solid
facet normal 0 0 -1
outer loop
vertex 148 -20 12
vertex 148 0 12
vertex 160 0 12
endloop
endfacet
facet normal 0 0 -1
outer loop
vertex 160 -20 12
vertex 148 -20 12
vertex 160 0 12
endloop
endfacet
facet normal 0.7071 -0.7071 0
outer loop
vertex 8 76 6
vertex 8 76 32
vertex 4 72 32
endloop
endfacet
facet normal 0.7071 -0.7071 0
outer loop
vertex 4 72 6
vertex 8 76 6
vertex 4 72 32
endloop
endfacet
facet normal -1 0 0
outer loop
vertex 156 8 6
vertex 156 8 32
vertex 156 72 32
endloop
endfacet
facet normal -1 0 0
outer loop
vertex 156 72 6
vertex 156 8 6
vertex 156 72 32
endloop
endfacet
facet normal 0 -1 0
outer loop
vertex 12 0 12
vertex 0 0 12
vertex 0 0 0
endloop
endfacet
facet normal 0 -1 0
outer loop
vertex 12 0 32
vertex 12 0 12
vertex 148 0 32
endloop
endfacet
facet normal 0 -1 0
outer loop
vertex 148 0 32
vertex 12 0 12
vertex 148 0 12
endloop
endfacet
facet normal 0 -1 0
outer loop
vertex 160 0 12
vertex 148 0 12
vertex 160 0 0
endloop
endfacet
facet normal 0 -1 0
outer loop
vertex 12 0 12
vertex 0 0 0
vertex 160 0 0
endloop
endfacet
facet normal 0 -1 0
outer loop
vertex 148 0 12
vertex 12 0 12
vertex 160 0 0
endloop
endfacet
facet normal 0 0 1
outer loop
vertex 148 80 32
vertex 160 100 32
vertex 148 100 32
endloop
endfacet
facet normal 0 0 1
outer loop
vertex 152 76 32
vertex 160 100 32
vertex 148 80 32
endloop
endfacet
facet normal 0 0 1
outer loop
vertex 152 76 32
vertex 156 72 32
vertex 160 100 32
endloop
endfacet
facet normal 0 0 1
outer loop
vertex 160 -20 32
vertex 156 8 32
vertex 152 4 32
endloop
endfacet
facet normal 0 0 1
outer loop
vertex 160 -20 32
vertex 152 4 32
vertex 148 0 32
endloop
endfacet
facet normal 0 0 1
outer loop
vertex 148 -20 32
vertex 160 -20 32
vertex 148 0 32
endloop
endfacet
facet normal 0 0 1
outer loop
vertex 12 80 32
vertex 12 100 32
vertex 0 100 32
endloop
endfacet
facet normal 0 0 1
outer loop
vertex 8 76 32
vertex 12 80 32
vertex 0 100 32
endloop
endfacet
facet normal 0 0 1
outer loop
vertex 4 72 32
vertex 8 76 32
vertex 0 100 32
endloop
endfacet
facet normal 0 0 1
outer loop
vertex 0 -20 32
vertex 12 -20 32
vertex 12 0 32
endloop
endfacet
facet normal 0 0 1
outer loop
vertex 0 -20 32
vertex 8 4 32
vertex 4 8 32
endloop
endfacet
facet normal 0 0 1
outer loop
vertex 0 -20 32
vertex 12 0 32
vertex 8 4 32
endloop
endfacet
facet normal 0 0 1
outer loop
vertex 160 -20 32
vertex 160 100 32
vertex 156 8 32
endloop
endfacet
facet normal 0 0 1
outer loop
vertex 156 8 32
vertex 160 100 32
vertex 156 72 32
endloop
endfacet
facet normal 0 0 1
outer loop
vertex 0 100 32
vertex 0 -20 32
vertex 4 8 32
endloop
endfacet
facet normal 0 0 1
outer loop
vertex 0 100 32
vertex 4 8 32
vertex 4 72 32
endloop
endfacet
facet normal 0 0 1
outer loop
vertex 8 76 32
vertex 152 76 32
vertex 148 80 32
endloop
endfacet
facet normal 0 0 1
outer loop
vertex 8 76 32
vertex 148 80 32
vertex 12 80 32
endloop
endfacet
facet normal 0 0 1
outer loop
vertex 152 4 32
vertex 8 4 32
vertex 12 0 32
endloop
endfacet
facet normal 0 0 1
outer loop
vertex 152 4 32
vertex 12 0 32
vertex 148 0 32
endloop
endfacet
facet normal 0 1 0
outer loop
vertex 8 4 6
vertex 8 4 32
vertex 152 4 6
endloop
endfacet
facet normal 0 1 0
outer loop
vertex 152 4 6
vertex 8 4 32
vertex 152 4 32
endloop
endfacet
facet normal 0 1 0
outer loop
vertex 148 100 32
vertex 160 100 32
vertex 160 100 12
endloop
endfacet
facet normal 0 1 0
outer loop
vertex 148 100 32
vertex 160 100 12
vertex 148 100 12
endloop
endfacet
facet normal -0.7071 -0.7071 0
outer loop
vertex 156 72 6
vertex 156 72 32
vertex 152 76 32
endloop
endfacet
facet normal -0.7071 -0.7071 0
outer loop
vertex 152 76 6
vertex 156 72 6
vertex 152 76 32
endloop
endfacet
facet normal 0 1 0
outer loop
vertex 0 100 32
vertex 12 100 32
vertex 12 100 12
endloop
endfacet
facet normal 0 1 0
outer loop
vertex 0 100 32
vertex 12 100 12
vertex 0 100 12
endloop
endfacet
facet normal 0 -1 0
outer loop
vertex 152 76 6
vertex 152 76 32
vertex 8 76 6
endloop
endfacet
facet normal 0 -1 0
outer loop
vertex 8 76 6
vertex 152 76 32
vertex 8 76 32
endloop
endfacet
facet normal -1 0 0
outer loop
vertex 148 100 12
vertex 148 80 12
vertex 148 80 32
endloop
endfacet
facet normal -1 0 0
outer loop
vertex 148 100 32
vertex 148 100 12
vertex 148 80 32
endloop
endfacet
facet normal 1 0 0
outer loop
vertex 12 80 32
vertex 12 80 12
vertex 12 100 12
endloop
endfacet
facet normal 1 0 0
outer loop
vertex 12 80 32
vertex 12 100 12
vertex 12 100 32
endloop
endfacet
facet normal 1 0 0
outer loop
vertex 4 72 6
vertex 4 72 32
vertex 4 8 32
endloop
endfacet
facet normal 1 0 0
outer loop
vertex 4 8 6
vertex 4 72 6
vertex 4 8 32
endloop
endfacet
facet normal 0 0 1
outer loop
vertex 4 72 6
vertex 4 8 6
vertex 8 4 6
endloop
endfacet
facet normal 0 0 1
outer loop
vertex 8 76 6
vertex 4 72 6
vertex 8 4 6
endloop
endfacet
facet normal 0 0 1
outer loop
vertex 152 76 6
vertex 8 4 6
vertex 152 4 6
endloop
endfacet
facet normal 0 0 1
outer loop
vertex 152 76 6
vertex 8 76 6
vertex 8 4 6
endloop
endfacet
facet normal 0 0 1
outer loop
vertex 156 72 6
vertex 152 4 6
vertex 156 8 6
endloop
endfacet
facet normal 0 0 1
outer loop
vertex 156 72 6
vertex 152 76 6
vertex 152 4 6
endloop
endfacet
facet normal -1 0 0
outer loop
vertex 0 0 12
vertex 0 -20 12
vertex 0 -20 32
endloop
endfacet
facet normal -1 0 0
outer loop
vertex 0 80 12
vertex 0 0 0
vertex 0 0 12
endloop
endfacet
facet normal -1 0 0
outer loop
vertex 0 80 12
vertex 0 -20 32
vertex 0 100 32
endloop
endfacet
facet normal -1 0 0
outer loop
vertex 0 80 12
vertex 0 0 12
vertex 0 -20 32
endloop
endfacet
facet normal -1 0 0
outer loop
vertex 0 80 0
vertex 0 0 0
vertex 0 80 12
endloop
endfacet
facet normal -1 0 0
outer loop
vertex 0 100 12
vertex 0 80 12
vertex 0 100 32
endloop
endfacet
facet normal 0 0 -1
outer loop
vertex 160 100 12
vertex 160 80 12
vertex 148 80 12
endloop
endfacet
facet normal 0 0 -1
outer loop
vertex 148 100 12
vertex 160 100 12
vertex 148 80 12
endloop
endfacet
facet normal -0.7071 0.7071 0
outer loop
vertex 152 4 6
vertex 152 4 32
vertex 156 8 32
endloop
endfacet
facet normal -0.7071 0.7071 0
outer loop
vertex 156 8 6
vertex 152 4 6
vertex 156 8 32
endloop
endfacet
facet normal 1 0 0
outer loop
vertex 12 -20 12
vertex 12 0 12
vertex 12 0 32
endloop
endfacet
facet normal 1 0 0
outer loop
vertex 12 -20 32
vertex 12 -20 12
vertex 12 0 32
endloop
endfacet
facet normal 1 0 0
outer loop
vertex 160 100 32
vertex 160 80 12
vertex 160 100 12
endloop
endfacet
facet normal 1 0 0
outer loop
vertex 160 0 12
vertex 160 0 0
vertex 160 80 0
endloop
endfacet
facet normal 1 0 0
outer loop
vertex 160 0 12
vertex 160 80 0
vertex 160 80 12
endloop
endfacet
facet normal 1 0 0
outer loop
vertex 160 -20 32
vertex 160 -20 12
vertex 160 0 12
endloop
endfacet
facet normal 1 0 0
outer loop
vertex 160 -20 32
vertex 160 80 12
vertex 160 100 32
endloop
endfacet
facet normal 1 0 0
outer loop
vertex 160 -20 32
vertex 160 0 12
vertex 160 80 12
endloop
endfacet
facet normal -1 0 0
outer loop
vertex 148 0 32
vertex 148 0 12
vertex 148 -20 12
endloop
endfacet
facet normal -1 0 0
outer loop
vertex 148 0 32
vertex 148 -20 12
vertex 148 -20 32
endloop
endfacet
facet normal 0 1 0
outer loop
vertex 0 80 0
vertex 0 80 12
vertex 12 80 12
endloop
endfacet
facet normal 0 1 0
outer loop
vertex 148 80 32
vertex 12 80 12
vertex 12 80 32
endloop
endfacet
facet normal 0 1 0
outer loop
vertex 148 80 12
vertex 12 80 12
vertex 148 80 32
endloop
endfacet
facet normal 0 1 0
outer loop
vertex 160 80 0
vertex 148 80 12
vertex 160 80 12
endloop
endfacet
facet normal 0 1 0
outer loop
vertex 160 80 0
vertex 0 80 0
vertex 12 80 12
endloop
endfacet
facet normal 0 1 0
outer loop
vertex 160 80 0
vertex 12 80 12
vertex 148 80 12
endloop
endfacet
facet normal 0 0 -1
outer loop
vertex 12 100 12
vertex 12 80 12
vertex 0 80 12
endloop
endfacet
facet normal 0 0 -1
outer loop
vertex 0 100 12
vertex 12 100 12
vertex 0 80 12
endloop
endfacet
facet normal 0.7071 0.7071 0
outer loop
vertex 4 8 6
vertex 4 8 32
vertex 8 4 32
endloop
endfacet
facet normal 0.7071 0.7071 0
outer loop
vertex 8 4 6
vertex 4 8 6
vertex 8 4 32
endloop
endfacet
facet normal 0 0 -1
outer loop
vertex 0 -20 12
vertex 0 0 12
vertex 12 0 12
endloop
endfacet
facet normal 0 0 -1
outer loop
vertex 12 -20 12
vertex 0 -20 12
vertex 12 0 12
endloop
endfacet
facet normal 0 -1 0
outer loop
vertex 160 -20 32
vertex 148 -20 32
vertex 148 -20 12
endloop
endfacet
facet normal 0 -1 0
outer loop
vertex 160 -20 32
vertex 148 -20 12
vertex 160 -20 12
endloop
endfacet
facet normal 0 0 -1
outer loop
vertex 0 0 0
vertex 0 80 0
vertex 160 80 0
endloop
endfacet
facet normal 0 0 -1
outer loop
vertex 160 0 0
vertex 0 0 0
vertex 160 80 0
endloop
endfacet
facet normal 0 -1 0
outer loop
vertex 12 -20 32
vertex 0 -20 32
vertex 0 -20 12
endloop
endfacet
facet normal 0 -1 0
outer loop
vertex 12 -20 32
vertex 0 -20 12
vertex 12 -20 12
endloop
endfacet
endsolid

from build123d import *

# Parameters (mm, degrees)
SKETCH_W     = 160
SKETCH_H     = 80
PAD_DEPTH    = 32
POCKET_DEPTH = 26
SKETCH002_W  = 12
SKETCH002_H  = 20
PAD001_DEPTH = 20
SKETCH003_W  = 12
SKETCH003_H  = 20
PAD002_DEPTH = 20


with BuildPart() as part:
    # Sketch → Pad (new body)
    with BuildSketch(Plane.XY):
        with Locations((80, 40)):
            Rectangle(SKETCH_W, SKETCH_H)
    extrude(amount=PAD_DEPTH)

    # Sketch001 (on Face6 of Pad) → Pocket (cut)
    with BuildSketch(Plane.XY.offset(32)):
        Polygon((8, 76), (4, 72), (4, 8), (8, 4), (152, 4), (156, 8), (156, 72), (152, 76), align=None)
    extrude(amount=-POCKET_DEPTH, mode=Mode.SUBTRACT)

    # Sketch002 (on Face6 of Pocket) → Pad001 (join)
    with BuildSketch(Plane.XZ):
        with Locations((154, 22)):
            Rectangle(SKETCH002_W, SKETCH002_H)
        with Locations((6, 22)):
            Rectangle(SKETCH002_W, SKETCH002_H)
    extrude(amount=PAD001_DEPTH)

    # Sketch003 (on Face1 of Pad001) → Pad002 (join)
    with BuildSketch(Plane(origin=(0, 80, 0), x_dir=(-1, 0, 0), z_dir=(0, 1, 0))):
        with Locations((-154, 22)):
            Rectangle(SKETCH003_W, SKETCH003_H)
        with Locations((-6, 22)):
            Rectangle(SKETCH003_W, SKETCH003_H)
    extrude(amount=PAD002_DEPTH)


solid = part.part
